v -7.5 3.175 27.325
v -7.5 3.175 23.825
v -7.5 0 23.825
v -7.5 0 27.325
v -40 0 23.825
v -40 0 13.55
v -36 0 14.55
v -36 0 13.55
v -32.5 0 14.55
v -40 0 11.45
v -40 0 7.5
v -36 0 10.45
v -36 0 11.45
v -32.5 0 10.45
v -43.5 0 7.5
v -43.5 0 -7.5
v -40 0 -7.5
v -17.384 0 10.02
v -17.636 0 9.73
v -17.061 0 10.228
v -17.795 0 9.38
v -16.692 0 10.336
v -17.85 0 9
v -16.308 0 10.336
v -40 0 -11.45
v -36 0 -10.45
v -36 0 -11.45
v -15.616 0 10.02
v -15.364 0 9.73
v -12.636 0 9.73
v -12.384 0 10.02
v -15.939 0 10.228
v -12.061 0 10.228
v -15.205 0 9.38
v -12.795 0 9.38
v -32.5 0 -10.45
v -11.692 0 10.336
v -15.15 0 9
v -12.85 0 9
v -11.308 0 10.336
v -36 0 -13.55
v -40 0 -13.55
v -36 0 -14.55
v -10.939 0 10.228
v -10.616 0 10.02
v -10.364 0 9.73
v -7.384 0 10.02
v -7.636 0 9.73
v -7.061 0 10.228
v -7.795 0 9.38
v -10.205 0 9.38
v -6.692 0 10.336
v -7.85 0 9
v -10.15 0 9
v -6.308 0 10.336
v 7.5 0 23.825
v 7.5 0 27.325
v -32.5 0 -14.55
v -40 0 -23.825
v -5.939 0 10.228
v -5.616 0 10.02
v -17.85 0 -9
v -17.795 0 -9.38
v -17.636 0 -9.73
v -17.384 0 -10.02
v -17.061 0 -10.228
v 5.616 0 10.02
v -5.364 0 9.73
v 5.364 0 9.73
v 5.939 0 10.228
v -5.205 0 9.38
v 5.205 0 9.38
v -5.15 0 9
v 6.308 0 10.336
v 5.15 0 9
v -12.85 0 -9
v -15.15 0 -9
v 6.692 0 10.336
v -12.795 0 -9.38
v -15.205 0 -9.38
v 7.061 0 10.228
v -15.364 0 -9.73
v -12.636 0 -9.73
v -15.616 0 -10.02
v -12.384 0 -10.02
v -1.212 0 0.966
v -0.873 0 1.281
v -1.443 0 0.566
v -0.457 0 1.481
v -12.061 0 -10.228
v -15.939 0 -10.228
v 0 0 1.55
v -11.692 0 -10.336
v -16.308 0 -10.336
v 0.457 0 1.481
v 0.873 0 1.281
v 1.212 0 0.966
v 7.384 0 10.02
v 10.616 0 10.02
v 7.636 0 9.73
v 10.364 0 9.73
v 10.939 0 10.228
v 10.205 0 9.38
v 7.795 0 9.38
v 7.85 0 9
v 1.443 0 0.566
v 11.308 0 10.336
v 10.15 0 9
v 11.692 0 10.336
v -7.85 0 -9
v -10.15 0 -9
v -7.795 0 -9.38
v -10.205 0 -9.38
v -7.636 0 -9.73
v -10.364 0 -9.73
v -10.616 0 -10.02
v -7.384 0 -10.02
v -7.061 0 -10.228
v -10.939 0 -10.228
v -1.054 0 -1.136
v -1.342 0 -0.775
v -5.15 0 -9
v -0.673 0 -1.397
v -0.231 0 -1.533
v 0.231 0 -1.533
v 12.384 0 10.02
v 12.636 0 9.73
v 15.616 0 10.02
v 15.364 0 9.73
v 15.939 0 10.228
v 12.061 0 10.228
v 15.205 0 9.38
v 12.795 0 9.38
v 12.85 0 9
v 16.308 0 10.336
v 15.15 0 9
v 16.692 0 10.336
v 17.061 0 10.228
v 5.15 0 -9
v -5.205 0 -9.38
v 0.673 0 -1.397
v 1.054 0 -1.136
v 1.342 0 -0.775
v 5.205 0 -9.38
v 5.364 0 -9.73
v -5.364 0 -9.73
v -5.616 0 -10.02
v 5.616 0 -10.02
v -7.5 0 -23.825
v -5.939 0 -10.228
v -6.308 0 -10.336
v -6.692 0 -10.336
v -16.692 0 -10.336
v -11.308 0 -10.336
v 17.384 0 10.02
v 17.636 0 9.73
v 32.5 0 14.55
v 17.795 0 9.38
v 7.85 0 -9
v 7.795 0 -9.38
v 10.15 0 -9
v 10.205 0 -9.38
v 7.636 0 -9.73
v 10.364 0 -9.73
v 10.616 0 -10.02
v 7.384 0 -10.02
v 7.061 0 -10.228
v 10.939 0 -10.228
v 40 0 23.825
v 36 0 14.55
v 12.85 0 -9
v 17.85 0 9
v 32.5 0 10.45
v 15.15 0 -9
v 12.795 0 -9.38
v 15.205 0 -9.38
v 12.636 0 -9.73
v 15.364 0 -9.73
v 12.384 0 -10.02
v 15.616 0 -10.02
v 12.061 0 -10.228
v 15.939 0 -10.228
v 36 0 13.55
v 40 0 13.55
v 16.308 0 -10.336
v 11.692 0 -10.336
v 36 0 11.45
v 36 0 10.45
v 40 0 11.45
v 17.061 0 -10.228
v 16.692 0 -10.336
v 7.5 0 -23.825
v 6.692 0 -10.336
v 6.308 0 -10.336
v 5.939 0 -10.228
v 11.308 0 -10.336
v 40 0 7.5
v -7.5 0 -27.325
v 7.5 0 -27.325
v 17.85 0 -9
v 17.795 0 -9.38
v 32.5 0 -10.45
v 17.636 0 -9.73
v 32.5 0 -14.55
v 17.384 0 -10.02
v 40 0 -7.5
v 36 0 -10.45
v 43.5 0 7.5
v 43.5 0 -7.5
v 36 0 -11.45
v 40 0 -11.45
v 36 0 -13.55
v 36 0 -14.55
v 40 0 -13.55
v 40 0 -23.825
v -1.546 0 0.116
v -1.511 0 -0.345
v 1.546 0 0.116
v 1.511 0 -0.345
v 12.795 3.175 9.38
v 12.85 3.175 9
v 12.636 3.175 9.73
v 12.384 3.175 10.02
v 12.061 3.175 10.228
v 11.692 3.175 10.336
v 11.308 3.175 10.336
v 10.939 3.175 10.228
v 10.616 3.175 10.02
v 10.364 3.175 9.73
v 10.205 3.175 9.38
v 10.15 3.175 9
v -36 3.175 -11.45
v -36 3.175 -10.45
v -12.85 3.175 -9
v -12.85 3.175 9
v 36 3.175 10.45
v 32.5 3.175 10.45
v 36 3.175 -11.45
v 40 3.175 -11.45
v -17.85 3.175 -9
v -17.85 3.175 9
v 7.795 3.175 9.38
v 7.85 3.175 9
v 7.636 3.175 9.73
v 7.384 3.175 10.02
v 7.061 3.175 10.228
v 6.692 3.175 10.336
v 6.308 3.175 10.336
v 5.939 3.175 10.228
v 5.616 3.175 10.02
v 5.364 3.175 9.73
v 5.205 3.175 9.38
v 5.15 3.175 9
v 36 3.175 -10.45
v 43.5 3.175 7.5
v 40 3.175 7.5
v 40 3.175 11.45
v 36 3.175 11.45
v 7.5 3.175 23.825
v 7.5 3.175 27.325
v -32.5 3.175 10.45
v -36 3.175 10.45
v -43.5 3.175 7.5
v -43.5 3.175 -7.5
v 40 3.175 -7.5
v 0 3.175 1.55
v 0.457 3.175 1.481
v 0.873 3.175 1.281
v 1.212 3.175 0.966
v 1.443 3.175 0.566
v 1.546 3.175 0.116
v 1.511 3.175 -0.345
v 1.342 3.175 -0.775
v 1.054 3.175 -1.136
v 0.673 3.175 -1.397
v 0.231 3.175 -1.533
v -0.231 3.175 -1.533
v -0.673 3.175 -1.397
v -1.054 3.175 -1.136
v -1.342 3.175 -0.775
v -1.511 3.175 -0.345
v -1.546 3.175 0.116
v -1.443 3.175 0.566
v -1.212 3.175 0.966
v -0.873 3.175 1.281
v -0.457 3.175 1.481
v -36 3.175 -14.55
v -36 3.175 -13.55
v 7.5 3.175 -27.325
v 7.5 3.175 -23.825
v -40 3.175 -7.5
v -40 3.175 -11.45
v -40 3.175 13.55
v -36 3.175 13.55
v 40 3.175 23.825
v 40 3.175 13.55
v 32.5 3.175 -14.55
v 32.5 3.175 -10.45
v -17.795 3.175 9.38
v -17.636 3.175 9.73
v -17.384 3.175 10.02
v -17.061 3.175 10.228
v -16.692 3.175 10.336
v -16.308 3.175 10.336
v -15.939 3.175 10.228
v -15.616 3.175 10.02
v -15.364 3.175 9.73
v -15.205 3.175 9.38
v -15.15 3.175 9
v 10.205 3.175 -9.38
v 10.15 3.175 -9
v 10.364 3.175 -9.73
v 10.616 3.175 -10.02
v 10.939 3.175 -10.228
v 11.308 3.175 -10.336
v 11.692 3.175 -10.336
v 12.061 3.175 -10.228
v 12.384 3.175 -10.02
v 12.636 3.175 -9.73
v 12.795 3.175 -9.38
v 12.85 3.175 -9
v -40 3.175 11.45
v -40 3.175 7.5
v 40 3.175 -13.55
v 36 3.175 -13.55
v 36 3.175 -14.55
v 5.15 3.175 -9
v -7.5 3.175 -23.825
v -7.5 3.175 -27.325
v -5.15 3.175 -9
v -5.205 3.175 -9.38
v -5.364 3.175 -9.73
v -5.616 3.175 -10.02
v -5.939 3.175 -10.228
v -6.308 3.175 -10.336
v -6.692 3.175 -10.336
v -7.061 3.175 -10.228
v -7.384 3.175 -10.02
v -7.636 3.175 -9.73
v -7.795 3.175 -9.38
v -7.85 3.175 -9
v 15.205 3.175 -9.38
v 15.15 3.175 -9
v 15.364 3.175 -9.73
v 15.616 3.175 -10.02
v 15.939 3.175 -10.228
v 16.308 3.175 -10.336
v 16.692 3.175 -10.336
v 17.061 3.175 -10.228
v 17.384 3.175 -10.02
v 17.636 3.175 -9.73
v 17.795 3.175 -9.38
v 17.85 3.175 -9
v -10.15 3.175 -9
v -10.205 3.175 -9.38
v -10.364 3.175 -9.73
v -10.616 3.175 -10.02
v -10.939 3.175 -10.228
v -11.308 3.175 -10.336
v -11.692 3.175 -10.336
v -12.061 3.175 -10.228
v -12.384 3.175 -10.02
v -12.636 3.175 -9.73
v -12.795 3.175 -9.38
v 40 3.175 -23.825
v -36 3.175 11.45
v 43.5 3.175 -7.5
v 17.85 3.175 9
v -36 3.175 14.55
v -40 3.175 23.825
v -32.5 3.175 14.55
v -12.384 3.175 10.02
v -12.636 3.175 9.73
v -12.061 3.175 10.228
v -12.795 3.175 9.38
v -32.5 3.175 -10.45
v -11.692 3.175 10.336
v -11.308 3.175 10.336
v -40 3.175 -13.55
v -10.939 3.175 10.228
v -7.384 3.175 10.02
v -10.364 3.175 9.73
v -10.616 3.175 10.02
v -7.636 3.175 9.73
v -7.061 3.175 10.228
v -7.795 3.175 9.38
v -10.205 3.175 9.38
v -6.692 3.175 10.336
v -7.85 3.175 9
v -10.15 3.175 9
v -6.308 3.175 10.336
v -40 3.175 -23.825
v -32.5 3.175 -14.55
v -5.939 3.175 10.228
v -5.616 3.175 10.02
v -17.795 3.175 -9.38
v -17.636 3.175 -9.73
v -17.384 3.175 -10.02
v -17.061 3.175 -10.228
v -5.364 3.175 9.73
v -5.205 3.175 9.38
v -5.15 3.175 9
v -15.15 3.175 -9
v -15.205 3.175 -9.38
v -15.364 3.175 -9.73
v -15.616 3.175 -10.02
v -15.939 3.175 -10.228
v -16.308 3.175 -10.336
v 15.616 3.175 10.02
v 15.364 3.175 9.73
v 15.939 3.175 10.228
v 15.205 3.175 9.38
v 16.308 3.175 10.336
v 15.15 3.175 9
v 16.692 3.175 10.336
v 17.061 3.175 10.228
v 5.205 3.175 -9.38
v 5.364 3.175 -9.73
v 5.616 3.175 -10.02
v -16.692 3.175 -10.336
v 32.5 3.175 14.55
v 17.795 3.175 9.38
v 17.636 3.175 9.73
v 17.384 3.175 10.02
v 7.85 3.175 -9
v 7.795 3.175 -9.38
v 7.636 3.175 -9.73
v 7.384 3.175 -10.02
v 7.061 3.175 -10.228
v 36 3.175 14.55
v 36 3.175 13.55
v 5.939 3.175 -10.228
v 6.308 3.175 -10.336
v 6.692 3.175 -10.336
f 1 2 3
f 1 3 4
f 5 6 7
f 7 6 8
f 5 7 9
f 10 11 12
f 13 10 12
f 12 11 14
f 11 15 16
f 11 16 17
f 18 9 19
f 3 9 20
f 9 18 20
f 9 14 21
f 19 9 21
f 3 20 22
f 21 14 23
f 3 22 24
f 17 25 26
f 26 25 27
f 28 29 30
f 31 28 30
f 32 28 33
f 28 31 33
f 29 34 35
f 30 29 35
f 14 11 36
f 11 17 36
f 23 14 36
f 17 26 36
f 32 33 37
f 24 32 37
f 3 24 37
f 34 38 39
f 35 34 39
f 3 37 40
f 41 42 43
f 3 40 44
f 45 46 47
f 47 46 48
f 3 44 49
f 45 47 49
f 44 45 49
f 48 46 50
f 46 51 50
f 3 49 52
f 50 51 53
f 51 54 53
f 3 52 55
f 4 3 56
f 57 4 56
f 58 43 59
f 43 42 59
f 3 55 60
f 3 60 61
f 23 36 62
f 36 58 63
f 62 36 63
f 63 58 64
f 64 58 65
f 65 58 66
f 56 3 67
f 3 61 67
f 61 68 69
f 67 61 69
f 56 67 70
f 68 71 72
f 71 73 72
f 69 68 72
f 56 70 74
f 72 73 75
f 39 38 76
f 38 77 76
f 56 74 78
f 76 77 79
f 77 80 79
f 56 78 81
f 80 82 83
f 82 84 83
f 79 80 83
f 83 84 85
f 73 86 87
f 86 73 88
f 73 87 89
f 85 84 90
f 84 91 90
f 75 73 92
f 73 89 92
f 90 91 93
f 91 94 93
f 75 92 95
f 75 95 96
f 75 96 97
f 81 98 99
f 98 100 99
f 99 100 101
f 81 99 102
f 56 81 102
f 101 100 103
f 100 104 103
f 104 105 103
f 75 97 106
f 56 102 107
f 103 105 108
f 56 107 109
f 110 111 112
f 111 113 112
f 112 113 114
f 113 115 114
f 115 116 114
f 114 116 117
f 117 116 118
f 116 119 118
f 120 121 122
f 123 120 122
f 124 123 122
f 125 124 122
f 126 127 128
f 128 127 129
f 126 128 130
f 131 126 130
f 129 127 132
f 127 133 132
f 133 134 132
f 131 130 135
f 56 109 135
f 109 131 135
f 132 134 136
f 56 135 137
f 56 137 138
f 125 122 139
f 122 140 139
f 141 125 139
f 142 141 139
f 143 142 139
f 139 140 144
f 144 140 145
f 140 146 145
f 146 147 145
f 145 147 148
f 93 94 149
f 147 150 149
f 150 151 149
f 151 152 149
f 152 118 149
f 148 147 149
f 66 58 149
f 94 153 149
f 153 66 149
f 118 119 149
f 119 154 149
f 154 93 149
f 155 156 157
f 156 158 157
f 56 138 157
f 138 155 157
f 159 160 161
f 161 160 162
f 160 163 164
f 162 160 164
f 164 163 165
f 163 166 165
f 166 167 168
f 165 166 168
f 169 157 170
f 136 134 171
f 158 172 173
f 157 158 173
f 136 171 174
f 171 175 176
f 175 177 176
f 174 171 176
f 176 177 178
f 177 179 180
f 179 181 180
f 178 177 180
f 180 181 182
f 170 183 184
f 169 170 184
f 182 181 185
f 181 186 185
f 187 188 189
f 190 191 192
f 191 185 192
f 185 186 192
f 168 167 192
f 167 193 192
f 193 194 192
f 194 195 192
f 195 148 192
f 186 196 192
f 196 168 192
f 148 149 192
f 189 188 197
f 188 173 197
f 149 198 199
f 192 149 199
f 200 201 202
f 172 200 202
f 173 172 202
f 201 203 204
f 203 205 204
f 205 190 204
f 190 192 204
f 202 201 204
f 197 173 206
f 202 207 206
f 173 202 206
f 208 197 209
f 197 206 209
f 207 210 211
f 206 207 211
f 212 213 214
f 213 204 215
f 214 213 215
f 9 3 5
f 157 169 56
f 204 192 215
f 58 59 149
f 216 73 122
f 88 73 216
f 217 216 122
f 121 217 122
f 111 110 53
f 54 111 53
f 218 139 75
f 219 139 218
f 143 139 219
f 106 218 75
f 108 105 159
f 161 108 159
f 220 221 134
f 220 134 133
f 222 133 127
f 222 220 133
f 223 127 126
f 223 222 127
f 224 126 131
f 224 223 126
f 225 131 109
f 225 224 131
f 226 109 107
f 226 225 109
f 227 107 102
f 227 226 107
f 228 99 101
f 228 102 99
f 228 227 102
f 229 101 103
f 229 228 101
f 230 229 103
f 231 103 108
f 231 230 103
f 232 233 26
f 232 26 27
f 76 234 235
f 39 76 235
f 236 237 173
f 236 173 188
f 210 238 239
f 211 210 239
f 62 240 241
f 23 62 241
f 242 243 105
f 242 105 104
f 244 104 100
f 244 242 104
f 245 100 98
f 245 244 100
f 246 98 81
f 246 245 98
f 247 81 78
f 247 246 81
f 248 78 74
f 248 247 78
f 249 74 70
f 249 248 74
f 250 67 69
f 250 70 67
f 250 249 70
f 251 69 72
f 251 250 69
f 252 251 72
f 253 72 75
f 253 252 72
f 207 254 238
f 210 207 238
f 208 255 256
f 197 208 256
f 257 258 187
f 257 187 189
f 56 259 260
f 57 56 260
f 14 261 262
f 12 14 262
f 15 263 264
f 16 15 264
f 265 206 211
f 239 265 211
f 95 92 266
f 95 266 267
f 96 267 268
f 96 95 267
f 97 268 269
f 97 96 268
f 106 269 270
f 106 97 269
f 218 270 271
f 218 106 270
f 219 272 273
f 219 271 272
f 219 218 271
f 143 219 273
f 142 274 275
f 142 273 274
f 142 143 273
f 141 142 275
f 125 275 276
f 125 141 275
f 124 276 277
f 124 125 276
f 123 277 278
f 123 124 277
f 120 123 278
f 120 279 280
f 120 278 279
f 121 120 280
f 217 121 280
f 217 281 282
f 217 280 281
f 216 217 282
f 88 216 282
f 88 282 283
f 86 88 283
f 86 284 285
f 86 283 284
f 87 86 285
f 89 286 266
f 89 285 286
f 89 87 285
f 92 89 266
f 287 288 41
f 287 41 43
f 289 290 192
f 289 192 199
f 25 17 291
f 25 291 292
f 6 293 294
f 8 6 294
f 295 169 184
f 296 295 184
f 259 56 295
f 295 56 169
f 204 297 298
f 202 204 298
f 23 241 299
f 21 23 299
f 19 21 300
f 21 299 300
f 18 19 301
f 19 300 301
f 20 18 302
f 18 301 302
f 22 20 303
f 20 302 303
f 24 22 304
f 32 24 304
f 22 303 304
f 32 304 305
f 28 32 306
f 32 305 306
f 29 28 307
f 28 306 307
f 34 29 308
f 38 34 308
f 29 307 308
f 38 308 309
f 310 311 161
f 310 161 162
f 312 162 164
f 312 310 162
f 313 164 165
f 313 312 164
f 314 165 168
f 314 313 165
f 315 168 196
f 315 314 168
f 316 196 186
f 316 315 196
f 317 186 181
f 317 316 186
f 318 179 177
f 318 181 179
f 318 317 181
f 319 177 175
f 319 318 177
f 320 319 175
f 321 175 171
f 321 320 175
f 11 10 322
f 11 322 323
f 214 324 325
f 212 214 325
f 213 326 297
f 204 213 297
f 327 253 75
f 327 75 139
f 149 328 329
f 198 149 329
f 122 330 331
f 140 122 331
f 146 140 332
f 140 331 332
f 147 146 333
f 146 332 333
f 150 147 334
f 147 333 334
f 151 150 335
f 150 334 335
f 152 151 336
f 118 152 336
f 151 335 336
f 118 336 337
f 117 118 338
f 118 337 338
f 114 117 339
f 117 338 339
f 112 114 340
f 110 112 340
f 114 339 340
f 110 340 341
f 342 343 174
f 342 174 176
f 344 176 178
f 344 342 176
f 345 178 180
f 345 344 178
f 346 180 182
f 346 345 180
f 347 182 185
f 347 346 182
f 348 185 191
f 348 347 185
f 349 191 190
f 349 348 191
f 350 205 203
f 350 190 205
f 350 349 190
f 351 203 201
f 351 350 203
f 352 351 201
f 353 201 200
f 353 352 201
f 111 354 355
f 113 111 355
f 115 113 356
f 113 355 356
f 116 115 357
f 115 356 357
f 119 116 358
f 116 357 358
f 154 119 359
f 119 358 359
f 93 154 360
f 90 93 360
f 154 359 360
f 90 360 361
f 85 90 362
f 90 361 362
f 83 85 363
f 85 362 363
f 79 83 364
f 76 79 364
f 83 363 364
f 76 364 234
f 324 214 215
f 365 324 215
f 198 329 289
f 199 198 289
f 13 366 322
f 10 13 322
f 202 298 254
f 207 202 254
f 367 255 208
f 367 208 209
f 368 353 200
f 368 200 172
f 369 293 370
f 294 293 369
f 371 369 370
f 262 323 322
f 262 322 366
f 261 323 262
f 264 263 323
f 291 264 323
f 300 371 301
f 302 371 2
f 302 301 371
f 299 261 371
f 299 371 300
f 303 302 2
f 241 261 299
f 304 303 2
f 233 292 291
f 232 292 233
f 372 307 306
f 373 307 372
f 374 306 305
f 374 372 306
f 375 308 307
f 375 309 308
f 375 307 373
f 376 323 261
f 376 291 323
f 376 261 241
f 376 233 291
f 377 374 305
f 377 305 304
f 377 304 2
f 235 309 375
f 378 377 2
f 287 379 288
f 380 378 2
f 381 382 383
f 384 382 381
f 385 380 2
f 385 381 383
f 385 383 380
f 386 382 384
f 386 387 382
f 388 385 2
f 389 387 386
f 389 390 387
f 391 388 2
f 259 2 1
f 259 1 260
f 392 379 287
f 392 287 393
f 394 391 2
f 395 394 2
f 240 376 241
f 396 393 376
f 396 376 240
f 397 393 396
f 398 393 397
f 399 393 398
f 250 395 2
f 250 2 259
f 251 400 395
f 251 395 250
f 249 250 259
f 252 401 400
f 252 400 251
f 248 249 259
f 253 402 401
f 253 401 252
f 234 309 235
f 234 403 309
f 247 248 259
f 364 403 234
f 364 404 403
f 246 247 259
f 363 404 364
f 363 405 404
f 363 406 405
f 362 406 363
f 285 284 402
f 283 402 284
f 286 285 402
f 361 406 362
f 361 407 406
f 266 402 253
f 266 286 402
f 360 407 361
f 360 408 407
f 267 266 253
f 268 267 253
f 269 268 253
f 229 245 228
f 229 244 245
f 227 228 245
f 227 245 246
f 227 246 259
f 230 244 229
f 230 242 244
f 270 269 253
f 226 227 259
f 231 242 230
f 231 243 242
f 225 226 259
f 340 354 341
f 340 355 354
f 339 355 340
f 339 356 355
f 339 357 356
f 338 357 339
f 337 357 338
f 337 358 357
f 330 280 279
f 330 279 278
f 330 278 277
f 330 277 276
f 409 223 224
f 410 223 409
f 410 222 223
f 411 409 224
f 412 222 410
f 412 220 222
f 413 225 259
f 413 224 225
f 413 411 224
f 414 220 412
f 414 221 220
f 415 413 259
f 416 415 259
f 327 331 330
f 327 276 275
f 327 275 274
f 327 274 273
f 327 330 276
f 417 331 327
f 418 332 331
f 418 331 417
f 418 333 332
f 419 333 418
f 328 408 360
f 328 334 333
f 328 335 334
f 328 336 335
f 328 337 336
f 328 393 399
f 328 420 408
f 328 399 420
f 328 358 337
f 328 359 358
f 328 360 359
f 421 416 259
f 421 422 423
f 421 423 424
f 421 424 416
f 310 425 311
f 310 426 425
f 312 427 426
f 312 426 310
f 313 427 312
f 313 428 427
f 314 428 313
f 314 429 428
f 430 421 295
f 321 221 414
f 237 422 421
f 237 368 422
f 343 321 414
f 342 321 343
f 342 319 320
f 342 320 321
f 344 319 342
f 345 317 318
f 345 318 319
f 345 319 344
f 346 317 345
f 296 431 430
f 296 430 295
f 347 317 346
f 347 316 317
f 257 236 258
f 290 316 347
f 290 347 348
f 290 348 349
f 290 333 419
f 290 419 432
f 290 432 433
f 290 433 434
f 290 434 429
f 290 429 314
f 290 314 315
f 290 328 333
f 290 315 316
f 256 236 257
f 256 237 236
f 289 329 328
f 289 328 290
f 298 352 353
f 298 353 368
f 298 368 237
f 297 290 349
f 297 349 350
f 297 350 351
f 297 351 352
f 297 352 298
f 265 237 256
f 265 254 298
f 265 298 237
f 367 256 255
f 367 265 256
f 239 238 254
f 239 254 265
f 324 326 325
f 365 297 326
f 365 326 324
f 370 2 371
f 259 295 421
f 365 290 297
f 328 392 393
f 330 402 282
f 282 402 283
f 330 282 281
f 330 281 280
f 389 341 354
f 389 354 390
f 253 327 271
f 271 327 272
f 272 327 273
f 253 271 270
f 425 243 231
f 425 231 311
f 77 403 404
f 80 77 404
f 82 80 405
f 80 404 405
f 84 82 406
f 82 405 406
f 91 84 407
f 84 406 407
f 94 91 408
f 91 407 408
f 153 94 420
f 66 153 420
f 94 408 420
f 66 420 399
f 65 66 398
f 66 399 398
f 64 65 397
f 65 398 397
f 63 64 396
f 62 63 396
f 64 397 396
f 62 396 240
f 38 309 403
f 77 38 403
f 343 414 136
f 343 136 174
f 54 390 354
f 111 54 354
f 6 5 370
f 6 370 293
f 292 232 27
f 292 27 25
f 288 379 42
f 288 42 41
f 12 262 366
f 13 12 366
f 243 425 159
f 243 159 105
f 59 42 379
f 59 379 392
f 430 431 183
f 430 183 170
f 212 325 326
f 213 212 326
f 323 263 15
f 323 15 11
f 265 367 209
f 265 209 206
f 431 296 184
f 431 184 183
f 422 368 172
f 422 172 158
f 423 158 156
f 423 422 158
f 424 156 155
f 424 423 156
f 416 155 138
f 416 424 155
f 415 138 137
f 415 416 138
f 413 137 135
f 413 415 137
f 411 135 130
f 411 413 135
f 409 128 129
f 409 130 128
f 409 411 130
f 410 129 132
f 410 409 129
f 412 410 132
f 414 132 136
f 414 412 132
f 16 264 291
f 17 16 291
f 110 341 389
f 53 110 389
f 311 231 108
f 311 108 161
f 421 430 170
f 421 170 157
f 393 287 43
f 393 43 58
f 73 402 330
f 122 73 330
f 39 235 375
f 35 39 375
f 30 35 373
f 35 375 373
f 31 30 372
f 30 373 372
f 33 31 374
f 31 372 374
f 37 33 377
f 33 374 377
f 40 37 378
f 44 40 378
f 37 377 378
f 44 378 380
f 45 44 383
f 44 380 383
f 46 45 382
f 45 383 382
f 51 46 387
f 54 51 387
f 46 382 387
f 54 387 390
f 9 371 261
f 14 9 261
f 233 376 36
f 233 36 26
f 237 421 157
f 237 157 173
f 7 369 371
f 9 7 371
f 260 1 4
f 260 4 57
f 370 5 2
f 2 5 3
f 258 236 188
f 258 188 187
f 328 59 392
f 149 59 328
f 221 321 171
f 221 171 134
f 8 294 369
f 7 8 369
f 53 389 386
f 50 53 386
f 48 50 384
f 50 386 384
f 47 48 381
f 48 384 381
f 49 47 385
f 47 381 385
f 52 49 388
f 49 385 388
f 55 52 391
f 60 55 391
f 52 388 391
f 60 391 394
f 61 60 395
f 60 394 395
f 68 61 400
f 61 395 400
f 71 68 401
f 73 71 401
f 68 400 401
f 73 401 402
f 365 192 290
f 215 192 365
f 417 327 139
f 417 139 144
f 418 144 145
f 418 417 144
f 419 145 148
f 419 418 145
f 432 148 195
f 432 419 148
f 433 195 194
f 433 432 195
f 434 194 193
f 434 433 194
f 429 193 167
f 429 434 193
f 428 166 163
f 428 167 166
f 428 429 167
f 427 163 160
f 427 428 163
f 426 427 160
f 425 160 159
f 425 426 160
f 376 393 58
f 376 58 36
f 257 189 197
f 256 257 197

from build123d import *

# Parameters (mm, degrees)
SKETCH2_W               = 80
SKETCH2_H               = 47.65
BOSS_EXTRUDE1_DEPTH     = 3.175
SKETCH3_W               = 15
SKETCH3_H               = 3.5
BOSS_EXTRUDE2_DEPTH     = 3.175
SKETCH4_W               = 3.5
SKETCH4_H               = 15
BOSS_EXTRUDE3_DEPTH     = 3.175
MIRROR2_COPY_1_SKETCH_W = 3.5
MIRROR2_COPY_1_SKETCH_H = 15
MIRROR2_COPY_1_DEPTH    = 3.175
MIRROR2_COPY_2_SKETCH_W = 3.5
MIRROR2_COPY_2_SKETCH_H = 15
MIRROR2_COPY_2_DEPTH    = 3.175
CUT_EXTRUDE1_DEPTH      = 10
MIRROR4_COPY_1_DEPTH    = 10
CUT_EXTRUDE2_DEPTH      = 10
LPATTERN1_COUNT         = 3
LPATTERN1_PITCH         = 5
MIRROR5_COPY_1_DEPTH    = 10
MIRROR5_COPY_2_DEPTH    = 10
CUT_EXTRUDE6_DEPTH      = 52.468303353
CUT_EXTRUDE6_DEPTH_BACK = 52.468303353
SKETCH7_R               = 1.55


with BuildPart() as part:
    # Sketch2 → Boss-Extrude1 (new body)
    with BuildSketch(Plane(origin=(0, 0, 0), x_dir=(1, 0, 0), z_dir=(0, 1, 0))):
        Rectangle(SKETCH2_W, SKETCH2_H)
    extrude(amount=BOSS_EXTRUDE1_DEPTH)

    # Sketch3 → Boss-Extrude2 (add)
    with BuildSketch(Plane(origin=(0, 3.175, 0), x_dir=(1, 0, 0), z_dir=(0, 1, 0))):
        with Locations((0, 25.575)):
            Rectangle(SKETCH3_W, SKETCH3_H)
    boss_extrude2 = extrude(amount=-BOSS_EXTRUDE2_DEPTH)

    # Sketch4 → Boss-Extrude3 (add)
    with BuildSketch(Plane(origin=(0, 3.175, 0), x_dir=(1, 0, 0), z_dir=(0, 1, 0))):
        with Locations((-41.75, 0)):
            Rectangle(SKETCH4_W, SKETCH4_H)
    boss_extrude3 = extrude(amount=-BOSS_EXTRUDE3_DEPTH)

    # Mirror1: Boss-Extrude3 across plane
    add(boss_extrude3.mirror(Plane(origin=(0, 0, 0), x_dir=(0, 0, 1), z_dir=(1, 0, 0))))

    # Mirror2: Boss-Extrude2 across plane
    add(boss_extrude2.mirror(Plane.XY))

    # Mirror2 copy 1 sketch → Mirror2 copy 1 (add)
    with BuildSketch(Plane(origin=(0, 3.175, 0), x_dir=(-1, 0, 0), z_dir=(0, 1, 0))):
        with Locations((-41.75, 0)):
            Rectangle(MIRROR2_COPY_1_SKETCH_W, MIRROR2_COPY_1_SKETCH_H)
    extrude(amount=-MIRROR2_COPY_1_DEPTH)

    # Mirror2 copy 2 sketch → Mirror2 copy 2 (add)
    with BuildSketch(Plane(origin=(0, 3.175, 0), x_dir=(1, 0, 0), z_dir=(0, 1, 0))):
        with Locations((-41.75, 0)):
            Rectangle(MIRROR2_COPY_2_SKETCH_W, MIRROR2_COPY_2_SKETCH_H)
    extrude(amount=-MIRROR2_COPY_2_DEPTH)

    # Sketch5 → Cut-Extrude1 (cut)
    with BuildSketch(Plane(origin=(0, 3.175, 0), x_dir=(1, 0, 0), z_dir=(0, 1, 0))):
        Polygon((-40, 13.55), (-36, 13.55), (-36, 14.55), (-32.5, 14.55), (-32.5, 10.45), (-36, 10.45), (-36, 11.45), (-40, 11.45), align=None)
    cut_extrude1 = extrude(amount=-CUT_EXTRUDE1_DEPTH, mode=Mode.SUBTRACT)

    # Mirror3: Cut-Extrude1 across plane
    add(cut_extrude1.mirror(Plane.XY), mode=Mode.SUBTRACT)

    # Mirror4: Cut-Extrude1 across plane
    add(cut_extrude1.mirror(Plane(origin=(0, 0, 0), x_dir=(0, 0, 1), z_dir=(1, 0, 0))), mode=Mode.SUBTRACT)

    # Mirror4 copy 1 sketch → Mirror4 copy 1 (cut)
    with BuildSketch(Plane(origin=(0, 3.175, 0), x_dir=(-1, 0, 0), z_dir=(0, 1, 0))):
        Polygon((-40, 13.55), (-36, 13.55), (-36, 14.55), (-32.5, 14.55), (-32.5, 10.45), (-36, 10.45), (-36, 11.45), (-40, 11.45), align=None)
    extrude(amount=-MIRROR4_COPY_1_DEPTH, mode=Mode.SUBTRACT)

    # Sketch6 → Cut-Extrude2 (cut)
    with BuildSketch(Plane(origin=(0, 3.175, 0), x_dir=(1, 0, 0), z_dir=(0, 1, 0))):
        with BuildLine():
            Line((5.15, -9), (5.15, 9))
            ThreePointArc((5.15, 9), (6.5, 10.35), (7.85, 9))
            Line((7.85, 9), (7.85, -9))
            ThreePointArc((7.85, -9), (6.5, -10.35), (5.15, -9))
        make_face()
    cut_extrude2 = extrude(amount=-CUT_EXTRUDE2_DEPTH, mode=Mode.SUBTRACT)

    # LPattern1: Cut-Extrude2 ×3
    with Locations(*[(i * LPATTERN1_PITCH, 0, 0) for i in range(1, LPATTERN1_COUNT)]):
        add(cut_extrude2, mode=Mode.SUBTRACT)

    # Mirror5: Cut-Extrude2 across plane
    add(cut_extrude2.mirror(Plane(origin=(0, 0, 0), x_dir=(0, 0, 1), z_dir=(1, 0, 0))), mode=Mode.SUBTRACT)

    # Mirror5 copy 1 sketch → Mirror5 copy 1 (cut)
    with BuildSketch(Plane(origin=(-5, 3.175, 0), x_dir=(-1, 0, 0), z_dir=(0, 1, 0))):
        with BuildLine():
            Line((5.15, 9), (5.15, -9))
            ThreePointArc((5.15, -9), (6.5, -10.35), (7.85, -9))
            Line((7.85, -9), (7.85, 9))
            ThreePointArc((7.85, 9), (6.5, 10.35), (5.15, 9))
        make_face()
    extrude(amount=-MIRROR5_COPY_1_DEPTH, mode=Mode.SUBTRACT)

    # Mirror5 copy 2 sketch → Mirror5 copy 2 (cut)
    with BuildSketch(Plane(origin=(-10, 3.175, 0), x_dir=(-1, 0, 0), z_dir=(0, 1, 0))):
        with BuildLine():
            Line((5.15, 9), (5.15, -9))
            ThreePointArc((5.15, -9), (6.5, -10.35), (7.85, -9))
            Line((7.85, -9), (7.85, 9))
            ThreePointArc((7.85, 9), (6.5, 10.35), (5.15, 9))
        make_face()
    extrude(amount=-MIRROR5_COPY_2_DEPTH, mode=Mode.SUBTRACT)

    # Sketch7 → Cut-Extrude6 (cut, two sides: drawn at the far end of the back side and taken through both)
    with BuildSketch(Plane(origin=(0, 0, 0), x_dir=(1, 0, 0), z_dir=(0, 1, 0)).offset(-CUT_EXTRUDE6_DEPTH_BACK)):
        with Locations(Location((0, 0, 0), (0, 0, 270))):
            Circle(SKETCH7_R)
    extrude(amount=CUT_EXTRUDE6_DEPTH + CUT_EXTRUDE6_DEPTH_BACK, mode=Mode.SUBTRACT)


solid = part.part
